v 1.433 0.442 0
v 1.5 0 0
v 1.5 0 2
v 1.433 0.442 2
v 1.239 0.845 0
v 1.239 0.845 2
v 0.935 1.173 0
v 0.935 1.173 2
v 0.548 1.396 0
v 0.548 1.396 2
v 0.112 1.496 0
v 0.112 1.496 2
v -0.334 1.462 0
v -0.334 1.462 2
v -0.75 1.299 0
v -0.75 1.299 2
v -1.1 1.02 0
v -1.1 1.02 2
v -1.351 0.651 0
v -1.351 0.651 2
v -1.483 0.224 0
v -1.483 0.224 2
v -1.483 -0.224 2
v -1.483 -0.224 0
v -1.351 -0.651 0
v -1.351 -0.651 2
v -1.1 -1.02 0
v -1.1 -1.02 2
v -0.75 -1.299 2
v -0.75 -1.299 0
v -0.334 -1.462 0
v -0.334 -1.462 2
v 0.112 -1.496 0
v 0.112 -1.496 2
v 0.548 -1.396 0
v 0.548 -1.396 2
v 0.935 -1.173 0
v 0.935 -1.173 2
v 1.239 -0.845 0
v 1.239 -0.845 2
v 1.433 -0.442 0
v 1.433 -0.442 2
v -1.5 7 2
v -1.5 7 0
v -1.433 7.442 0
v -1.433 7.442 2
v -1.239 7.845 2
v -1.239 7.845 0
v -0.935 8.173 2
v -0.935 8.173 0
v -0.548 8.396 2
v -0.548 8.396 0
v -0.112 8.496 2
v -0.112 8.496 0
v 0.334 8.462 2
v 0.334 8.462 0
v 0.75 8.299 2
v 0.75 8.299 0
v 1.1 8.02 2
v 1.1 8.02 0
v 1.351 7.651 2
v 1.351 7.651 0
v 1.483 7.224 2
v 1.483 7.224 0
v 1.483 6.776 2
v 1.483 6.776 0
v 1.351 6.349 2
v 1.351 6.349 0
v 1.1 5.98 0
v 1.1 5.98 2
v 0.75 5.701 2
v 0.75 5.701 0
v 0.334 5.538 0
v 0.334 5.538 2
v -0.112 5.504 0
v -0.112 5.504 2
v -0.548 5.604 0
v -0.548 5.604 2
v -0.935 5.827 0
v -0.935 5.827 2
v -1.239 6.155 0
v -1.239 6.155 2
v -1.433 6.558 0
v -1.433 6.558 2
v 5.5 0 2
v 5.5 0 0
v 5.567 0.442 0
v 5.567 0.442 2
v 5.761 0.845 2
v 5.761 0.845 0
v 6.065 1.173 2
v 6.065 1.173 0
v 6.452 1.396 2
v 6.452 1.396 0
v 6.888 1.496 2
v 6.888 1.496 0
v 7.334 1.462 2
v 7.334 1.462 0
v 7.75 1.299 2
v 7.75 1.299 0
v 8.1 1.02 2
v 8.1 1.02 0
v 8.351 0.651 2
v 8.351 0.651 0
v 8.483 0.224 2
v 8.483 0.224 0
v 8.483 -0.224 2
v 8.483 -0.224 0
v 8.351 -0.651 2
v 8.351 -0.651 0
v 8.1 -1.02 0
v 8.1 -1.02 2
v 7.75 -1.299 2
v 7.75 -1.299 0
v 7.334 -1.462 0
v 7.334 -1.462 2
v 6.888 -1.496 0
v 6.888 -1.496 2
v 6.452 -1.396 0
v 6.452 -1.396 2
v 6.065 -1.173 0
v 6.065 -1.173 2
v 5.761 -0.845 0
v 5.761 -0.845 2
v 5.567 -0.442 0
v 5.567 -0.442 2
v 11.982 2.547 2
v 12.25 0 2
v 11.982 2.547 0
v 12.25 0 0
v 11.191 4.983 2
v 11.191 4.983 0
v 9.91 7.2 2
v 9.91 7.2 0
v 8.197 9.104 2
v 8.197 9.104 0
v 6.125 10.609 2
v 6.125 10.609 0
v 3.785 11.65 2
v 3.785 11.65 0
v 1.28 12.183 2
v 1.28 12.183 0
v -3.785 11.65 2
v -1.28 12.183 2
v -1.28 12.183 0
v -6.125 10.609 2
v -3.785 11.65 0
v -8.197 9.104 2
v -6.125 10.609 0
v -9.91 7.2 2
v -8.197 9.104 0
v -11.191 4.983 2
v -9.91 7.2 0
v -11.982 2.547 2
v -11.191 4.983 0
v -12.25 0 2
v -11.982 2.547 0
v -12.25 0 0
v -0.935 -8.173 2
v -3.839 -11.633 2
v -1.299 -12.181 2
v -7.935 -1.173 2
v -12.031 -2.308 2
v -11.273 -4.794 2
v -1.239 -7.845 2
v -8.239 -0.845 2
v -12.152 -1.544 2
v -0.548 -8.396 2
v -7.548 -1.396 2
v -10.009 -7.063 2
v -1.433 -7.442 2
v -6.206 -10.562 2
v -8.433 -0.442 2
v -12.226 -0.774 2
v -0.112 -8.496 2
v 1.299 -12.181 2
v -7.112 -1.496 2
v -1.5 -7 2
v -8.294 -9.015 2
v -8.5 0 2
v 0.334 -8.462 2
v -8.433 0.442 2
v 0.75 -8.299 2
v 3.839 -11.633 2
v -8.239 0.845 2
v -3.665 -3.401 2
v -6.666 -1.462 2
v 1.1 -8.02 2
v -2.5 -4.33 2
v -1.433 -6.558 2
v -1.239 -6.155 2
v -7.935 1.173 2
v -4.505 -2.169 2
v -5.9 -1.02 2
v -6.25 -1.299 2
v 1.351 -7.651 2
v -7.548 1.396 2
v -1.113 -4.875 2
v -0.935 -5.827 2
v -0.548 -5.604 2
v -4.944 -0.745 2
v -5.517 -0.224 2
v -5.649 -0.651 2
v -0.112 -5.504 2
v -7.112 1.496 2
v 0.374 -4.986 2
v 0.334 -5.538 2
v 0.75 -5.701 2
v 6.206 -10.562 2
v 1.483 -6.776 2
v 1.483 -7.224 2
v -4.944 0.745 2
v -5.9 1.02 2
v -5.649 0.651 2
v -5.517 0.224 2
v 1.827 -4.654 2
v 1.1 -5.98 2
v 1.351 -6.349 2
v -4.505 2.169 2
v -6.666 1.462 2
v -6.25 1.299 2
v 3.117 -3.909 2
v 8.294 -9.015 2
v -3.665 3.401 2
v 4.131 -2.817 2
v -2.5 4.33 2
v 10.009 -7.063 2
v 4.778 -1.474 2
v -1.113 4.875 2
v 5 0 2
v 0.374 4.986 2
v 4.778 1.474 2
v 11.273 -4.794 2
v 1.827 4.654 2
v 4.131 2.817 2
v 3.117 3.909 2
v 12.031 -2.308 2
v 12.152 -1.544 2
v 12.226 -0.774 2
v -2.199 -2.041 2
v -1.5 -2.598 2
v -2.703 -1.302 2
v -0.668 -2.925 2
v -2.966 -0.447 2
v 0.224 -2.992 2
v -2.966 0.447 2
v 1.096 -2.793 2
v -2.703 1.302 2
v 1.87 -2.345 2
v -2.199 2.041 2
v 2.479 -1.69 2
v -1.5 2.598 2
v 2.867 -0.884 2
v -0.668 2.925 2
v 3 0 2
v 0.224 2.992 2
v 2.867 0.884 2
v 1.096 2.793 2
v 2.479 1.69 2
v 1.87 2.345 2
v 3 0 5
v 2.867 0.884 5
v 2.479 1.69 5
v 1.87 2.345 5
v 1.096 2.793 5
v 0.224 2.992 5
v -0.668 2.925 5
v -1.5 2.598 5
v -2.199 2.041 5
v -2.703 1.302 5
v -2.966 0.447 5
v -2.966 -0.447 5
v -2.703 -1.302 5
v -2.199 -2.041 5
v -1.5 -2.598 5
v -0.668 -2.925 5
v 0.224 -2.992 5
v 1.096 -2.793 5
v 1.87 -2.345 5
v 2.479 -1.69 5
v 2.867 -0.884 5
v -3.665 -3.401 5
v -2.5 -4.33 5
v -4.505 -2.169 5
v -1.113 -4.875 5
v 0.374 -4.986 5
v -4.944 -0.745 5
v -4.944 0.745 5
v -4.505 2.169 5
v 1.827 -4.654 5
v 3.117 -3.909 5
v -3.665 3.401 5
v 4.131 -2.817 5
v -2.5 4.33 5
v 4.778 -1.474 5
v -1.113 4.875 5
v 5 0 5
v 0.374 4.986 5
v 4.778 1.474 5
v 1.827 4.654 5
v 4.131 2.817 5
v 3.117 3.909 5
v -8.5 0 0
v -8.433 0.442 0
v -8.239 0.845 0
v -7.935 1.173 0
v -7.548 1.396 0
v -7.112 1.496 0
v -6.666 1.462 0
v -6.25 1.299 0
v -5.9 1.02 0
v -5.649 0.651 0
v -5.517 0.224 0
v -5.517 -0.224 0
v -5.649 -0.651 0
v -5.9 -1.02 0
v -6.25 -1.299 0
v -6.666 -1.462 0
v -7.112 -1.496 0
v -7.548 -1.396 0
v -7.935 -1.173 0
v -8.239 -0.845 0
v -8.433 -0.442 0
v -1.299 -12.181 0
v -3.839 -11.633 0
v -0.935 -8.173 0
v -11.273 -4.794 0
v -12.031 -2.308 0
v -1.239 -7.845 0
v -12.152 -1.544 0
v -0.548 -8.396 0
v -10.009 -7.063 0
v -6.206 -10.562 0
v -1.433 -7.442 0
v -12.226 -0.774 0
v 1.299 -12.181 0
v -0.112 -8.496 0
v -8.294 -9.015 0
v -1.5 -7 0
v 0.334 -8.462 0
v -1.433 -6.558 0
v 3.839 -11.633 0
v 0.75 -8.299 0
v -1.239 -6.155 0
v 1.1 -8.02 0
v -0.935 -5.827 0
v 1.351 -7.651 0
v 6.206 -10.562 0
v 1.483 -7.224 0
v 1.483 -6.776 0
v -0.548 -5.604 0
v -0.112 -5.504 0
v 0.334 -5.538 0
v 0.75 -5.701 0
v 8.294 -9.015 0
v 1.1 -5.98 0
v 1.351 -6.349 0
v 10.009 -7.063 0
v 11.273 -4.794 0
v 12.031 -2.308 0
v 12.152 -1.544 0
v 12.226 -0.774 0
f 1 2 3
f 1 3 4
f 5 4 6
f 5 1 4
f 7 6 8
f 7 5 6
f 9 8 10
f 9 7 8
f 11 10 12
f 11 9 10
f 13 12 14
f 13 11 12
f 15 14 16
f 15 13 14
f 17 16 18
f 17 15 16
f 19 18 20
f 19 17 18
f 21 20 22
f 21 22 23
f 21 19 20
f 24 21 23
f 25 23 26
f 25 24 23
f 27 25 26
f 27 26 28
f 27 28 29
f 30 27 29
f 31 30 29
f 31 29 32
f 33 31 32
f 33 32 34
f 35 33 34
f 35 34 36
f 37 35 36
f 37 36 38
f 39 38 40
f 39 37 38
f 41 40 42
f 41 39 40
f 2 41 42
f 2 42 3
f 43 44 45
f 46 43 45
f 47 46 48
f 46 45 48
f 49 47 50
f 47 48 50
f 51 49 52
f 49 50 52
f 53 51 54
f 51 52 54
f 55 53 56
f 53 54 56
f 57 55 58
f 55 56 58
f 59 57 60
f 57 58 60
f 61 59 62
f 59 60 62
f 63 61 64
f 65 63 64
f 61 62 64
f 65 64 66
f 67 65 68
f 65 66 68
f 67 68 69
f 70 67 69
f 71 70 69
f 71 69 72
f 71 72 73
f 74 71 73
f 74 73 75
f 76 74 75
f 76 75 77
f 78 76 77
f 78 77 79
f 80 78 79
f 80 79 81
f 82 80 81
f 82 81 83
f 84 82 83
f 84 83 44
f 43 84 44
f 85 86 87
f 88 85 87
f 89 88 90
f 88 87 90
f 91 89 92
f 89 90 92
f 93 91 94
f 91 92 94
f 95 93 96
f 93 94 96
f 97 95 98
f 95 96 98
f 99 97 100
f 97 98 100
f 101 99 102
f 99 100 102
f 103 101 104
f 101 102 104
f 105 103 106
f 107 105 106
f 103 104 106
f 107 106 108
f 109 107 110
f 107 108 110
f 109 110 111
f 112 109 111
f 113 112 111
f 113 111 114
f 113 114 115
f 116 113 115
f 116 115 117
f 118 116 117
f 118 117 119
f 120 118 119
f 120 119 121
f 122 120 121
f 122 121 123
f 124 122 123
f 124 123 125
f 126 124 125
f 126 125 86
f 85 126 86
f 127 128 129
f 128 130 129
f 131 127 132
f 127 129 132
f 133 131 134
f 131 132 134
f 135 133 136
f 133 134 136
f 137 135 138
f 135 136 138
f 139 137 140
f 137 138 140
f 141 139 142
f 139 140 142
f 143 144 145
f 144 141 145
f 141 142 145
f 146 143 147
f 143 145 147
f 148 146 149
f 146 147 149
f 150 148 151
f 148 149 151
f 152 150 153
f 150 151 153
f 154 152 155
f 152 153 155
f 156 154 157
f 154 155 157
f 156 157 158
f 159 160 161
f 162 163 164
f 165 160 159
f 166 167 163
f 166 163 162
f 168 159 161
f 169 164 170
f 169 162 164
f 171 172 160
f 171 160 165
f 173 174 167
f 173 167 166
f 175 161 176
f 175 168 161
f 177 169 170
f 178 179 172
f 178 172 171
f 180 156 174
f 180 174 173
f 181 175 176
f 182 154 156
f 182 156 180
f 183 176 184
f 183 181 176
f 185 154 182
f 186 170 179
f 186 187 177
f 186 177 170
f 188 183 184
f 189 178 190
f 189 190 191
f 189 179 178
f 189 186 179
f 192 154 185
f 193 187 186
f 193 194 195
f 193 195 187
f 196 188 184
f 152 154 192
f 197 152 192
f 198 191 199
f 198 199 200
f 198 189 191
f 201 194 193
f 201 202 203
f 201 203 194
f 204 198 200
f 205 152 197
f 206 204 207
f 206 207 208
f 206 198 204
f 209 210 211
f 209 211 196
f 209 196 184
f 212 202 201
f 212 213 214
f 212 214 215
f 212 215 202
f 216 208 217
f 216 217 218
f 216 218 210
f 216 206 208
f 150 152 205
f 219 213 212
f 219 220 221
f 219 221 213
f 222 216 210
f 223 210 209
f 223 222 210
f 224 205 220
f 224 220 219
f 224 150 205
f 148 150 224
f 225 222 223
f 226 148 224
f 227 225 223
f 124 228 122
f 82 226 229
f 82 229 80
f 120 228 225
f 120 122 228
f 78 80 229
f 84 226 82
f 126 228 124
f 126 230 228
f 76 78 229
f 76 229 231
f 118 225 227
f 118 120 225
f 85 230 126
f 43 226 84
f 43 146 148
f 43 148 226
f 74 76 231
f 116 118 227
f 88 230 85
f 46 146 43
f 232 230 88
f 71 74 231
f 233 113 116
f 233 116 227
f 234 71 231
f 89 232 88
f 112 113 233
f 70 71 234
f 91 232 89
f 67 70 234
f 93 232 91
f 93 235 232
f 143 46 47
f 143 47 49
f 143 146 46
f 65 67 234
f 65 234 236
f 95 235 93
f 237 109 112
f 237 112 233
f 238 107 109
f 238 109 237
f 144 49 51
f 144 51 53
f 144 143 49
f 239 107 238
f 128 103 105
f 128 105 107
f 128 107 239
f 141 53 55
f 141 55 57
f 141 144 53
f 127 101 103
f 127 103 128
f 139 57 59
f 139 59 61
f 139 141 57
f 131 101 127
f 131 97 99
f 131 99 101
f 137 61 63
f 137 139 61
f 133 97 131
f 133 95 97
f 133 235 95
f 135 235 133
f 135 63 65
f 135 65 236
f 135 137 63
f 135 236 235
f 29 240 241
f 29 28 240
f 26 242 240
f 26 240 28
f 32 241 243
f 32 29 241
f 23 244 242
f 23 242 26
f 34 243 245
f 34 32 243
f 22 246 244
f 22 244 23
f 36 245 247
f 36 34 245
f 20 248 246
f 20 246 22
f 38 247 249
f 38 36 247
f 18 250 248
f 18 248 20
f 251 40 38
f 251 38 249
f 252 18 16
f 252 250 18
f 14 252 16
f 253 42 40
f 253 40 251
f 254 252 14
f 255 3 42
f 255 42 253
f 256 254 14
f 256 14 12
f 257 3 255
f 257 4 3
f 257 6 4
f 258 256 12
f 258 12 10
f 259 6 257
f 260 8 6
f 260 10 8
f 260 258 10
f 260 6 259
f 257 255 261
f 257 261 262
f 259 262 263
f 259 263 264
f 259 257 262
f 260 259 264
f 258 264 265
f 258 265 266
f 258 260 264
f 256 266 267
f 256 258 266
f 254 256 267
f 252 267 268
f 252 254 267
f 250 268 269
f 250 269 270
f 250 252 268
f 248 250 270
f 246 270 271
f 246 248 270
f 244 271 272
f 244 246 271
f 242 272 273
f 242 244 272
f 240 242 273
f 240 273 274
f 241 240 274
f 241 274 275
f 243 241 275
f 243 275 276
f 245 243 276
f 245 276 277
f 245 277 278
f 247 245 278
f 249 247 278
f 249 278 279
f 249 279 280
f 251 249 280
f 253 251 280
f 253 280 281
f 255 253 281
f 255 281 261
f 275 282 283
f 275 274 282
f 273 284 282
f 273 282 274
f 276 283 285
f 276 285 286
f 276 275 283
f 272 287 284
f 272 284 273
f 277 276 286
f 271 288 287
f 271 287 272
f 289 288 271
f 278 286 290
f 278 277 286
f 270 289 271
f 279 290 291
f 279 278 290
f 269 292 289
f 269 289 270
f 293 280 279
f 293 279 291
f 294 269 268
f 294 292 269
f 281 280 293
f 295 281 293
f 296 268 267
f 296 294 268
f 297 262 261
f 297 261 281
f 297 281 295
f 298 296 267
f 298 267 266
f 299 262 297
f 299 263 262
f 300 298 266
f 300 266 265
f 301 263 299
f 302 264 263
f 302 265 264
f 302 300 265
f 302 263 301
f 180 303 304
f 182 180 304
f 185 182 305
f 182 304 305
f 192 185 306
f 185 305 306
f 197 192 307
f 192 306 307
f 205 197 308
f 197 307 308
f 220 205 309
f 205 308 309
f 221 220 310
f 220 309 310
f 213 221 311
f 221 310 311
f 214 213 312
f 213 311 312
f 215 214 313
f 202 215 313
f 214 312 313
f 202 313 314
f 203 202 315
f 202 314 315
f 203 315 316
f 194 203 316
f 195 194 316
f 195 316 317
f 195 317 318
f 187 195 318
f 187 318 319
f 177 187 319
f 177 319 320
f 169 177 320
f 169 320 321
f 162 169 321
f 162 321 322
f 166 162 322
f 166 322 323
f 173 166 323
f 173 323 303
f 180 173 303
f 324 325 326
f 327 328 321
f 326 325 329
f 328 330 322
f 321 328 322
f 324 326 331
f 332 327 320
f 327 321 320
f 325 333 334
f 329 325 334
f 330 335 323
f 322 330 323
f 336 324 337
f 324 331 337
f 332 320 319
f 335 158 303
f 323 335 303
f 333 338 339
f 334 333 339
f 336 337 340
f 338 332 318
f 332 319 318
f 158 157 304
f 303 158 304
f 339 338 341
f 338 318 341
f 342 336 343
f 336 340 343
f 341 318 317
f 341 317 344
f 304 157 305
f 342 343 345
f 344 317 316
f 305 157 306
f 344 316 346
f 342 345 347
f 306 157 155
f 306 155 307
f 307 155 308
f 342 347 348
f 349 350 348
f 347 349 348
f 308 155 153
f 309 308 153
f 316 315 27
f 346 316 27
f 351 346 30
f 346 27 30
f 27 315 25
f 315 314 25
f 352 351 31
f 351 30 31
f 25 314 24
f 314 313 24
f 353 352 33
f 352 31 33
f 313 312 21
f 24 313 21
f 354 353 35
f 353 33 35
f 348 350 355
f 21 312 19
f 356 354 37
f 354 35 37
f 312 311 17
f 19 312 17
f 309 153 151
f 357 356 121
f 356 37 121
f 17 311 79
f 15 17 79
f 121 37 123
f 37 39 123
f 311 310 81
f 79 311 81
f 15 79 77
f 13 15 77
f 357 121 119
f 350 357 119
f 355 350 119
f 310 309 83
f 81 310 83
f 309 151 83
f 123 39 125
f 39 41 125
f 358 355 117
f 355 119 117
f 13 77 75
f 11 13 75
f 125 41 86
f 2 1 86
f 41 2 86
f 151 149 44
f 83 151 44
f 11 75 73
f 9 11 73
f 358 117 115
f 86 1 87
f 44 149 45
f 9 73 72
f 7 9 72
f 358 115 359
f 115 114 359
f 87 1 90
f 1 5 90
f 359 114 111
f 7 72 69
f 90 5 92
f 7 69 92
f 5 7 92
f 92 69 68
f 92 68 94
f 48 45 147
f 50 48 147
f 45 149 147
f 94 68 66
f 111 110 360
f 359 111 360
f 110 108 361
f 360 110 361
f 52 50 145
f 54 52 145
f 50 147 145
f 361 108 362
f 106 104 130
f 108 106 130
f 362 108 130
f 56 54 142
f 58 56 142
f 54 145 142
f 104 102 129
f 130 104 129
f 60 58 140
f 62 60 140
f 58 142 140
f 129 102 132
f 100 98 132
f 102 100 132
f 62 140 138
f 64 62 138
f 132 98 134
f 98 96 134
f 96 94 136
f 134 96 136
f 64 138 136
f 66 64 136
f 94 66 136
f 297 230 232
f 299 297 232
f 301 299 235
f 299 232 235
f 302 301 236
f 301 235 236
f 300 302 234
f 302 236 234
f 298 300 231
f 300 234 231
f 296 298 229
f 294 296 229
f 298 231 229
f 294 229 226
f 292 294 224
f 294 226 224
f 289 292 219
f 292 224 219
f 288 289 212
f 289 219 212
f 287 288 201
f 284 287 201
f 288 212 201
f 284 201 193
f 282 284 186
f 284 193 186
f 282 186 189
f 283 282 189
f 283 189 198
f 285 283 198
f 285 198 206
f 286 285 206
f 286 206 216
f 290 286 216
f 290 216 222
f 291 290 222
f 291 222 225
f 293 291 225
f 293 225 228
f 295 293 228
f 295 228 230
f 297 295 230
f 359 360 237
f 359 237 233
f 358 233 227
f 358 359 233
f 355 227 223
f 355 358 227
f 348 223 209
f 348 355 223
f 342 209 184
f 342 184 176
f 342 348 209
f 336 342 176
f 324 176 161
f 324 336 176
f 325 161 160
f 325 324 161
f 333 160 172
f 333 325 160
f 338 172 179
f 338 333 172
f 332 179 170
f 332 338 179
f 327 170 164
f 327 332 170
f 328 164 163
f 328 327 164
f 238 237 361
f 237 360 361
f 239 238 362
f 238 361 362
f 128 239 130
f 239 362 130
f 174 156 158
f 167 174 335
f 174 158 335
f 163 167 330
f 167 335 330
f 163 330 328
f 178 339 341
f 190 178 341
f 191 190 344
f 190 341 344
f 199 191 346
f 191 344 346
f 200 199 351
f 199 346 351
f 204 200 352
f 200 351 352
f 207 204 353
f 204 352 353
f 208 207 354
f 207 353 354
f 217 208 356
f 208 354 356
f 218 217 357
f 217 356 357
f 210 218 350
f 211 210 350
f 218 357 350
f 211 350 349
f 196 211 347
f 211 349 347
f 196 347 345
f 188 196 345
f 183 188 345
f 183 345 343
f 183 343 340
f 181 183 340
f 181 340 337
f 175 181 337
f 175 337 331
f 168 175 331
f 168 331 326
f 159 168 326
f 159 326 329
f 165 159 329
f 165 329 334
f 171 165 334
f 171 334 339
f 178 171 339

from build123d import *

# Parameters (mm, degrees)
SKETCH_1_R          = 12.25
SKETCH_1_R_2        = 1.5
EXTRUDE_1_DEPTH     = 2
SKETCH_2_R          = 5
SKETCH_2_R_2        = 3
EXTRUDE_2_DEPTH     = 3
EXTRUDE_3_DEPTH     = 2
SKETCH_4_R          = 1.5
CUT_EXTRUDE_1_DEPTH = 10
CUT_EXTRUDE_START   = -10
CUT_EXTRUDE_4_DEPTH = 10


with BuildPart() as part:
    # 草图1 → 凸台-拉伸1 (new body)
    with BuildSketch(Plane.XY):
        Circle(SKETCH_1_R)
        Circle(SKETCH_1_R_2, mode=Mode.SUBTRACT)
    extrude(amount=EXTRUDE_1_DEPTH)

    # 草图2 → 凸台-拉伸2 (add)
    with BuildSketch(Plane.XY.offset(2)):
        Circle(SKETCH_2_R)
        Circle(SKETCH_2_R_2, mode=Mode.SUBTRACT)
    extrude(amount=EXTRUDE_2_DEPTH)

    # 草图3 → 凸台-拉伸3 (add)
    with BuildSketch(Plane(origin=(0, 0, 0), x_dir=(-1, 0, 0), z_dir=(0, 0, -1))):
        with BuildLine():
            Line((12.030570384, -2.308219276), (-12.030570384, -2.308219276))
            Line((-12.030570384, -2.308219276), (-4.910436892, -39.418760727))
            ThreePointArc((-4.910436892, -39.418760727), (0, -43.47663041), (4.910436892, -39.418760727))
            Line((4.910436892, -39.418760727), (12.030570384, -2.308219276))
        make_face()
    extrude(amount=-EXTRUDE_3_DEPTH)

    # 草图4 → 切除-拉伸1 (cut)
    with BuildSketch(Plane(origin=(0, 0, 0), x_dir=(-1, 0, 0), z_dir=(0, 0, -1))):
        with Locations((7, 0)):
            Circle(SKETCH_4_R)
        with Locations((0, -7)):
            Circle(SKETCH_4_R)
        with Locations((-7, 0)):
            Circle(SKETCH_4_R)
        with Locations((0, 7)):
            Circle(SKETCH_4_R)
    extrude(amount=-CUT_EXTRUDE_1_DEPTH, mode=Mode.SUBTRACT)

    # 草图6 → 切除-拉伸4 (cut)
    with BuildSketch(Plane.XY.offset(2).offset(CUT_EXTRUDE_START)):
        with BuildLine():
            ThreePointArc((12.25, 0), (0, -12.25), (-12.25, 0))
            Line((-12.25, 0), (-14.856850111, -46.424662629))
            Line((-14.856850111, -46.424662629), (15.079980512, -43.09327684))
            Line((15.079980512, -43.09327684), (12.25, 0))
        make_face()
    extrude(amount=CUT_EXTRUDE_4_DEPTH, mode=Mode.SUBTRACT)


solid = part.part
